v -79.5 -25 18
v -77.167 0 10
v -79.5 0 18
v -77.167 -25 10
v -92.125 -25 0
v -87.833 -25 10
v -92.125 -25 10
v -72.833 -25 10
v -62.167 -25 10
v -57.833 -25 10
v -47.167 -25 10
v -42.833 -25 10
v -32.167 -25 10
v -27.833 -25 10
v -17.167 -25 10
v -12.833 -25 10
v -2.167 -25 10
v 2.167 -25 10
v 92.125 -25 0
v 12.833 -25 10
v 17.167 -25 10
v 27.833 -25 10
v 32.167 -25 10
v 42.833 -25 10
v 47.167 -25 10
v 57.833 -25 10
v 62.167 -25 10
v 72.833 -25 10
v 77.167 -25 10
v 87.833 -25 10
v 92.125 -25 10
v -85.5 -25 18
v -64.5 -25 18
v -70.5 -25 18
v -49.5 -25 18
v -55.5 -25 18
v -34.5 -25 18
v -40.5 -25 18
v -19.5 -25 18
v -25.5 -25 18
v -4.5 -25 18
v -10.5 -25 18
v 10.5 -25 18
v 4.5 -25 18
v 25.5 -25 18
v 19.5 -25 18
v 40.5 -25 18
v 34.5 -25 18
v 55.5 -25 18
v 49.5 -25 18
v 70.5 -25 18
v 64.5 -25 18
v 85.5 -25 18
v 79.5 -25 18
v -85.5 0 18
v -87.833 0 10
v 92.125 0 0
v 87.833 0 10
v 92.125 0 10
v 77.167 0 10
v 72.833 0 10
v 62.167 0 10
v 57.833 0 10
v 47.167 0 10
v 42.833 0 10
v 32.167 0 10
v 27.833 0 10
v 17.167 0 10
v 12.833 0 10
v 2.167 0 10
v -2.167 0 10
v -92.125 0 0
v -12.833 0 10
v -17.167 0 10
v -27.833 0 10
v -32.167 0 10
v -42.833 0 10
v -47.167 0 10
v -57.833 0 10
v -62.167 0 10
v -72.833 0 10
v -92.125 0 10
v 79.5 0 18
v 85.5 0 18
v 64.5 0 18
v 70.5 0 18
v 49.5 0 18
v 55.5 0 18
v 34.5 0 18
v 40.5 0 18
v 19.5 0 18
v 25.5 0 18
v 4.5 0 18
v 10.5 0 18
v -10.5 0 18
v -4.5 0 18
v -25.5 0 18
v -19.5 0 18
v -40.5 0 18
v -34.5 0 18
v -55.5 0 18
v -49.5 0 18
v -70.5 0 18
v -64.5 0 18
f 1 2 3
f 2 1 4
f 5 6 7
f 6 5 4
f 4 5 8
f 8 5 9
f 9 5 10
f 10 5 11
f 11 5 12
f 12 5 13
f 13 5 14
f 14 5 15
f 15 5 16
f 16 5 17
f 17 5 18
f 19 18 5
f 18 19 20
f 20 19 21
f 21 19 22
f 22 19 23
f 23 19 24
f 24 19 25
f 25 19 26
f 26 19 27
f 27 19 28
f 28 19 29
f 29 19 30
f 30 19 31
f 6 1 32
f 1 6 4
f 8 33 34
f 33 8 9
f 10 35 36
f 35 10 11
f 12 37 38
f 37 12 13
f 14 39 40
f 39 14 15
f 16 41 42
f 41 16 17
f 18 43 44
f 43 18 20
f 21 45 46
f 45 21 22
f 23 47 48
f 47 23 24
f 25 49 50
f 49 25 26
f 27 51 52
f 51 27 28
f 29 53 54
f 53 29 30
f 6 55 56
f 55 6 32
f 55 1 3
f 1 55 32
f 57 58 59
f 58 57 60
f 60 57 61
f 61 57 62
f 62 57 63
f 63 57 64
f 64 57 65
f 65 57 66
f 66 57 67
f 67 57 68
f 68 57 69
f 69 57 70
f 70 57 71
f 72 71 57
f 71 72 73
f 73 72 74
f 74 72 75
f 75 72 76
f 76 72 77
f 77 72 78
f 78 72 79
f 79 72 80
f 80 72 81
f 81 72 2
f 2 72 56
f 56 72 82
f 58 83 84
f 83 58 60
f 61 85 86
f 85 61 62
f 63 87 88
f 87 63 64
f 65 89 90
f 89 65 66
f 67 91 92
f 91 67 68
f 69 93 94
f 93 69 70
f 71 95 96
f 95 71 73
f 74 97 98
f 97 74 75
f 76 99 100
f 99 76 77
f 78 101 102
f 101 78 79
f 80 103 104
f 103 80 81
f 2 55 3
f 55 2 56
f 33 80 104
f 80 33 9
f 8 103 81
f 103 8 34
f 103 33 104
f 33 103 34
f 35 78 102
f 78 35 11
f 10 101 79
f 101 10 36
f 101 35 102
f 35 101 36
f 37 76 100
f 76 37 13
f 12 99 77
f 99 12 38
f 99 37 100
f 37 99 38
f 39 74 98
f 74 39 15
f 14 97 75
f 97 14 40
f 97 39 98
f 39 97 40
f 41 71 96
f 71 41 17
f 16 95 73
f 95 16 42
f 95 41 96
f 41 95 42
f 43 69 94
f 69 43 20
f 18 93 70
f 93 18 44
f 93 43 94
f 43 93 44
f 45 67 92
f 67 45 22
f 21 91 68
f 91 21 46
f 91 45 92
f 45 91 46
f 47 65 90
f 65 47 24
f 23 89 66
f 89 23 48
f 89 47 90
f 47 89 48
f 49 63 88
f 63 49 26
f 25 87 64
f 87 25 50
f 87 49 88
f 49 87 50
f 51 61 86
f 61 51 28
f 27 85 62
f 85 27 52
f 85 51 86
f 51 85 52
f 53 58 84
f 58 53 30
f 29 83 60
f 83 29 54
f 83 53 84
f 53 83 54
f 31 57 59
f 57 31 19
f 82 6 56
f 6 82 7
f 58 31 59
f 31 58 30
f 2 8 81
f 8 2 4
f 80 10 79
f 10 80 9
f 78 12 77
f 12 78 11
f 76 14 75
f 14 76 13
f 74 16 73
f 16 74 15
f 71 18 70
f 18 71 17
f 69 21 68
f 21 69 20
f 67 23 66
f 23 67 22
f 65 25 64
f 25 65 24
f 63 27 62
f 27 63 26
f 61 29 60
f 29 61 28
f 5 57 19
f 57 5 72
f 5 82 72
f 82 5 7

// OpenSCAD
$fn = 32;

// ----------------------------------------------------------------------
// Toothed rack, 12 teeth
// 15 mm pitch, 8 mm teeth
// ----------------------------------------------------------------------

// --- parameters (mm) ---
bar_w = 25;      // bar width (Y)
bar_h = 10;      // bar height (Z)
teeth = 12;      // number of teeth
pitch = 15;      // tooth pitch
tooth_h = 8;     // tooth height above the bar
root_w = 11.25;  // tooth width at the root
crest_w = 6;     // tooth width at the crest

// --- derived feature positions (mm) ---
span = (teeth - 1) * pitch;  // = 165   distance between the outer teeth
bar_l = span + root_w + 8;   // = 184.25   bar length: teeth plus 4 mm at each end
tooth_x = -span / 2;         // = -82.5   X of the first tooth
height = bar_h + tooth_h;    // = 18   overall height
feature_centers = [
  [tooth_x + 0 * pitch, -bar_w / 2],
  [tooth_x + 1 * pitch, -bar_w / 2],
  [tooth_x + 2 * pitch, -bar_w / 2],
  [tooth_x + 3 * pitch, -bar_w / 2],
  [tooth_x + 4 * pitch, -bar_w / 2],
  [tooth_x + 5 * pitch, -bar_w / 2],
  [tooth_x + 6 * pitch, -bar_w / 2],
  [tooth_x + 7 * pitch, -bar_w / 2],
  [tooth_x + 8 * pitch, -bar_w / 2],
  [tooth_x + 9 * pitch, -bar_w / 2],
  [tooth_x + 10 * pitch, -bar_w / 2],
  [tooth_x + 11 * pitch, -bar_w / 2]
];   // tooth centre line, drives the tooth loop

// bar with a rack of teeth, one extruded trapezoium per centre
module rack_tooth() {
  linear_extrude(height = bar_w)
    polygon(points = [
      [0, 0],
      [root_w, 0],
      [root_w / 2 + crest_w / 2, tooth_h + 1],
      [root_w / 2 - crest_w / 2, tooth_h + 1]
    ]);
}

union() {
  translate([-bar_l / 2, -bar_w, 0]) cube([bar_l, bar_w, bar_h]);
  for (centre = feature_centers)
    translate([centre[0] - root_w / 2, 0, bar_h - 1]) rotate([90, 0, 0]) rack_tooth();
}
